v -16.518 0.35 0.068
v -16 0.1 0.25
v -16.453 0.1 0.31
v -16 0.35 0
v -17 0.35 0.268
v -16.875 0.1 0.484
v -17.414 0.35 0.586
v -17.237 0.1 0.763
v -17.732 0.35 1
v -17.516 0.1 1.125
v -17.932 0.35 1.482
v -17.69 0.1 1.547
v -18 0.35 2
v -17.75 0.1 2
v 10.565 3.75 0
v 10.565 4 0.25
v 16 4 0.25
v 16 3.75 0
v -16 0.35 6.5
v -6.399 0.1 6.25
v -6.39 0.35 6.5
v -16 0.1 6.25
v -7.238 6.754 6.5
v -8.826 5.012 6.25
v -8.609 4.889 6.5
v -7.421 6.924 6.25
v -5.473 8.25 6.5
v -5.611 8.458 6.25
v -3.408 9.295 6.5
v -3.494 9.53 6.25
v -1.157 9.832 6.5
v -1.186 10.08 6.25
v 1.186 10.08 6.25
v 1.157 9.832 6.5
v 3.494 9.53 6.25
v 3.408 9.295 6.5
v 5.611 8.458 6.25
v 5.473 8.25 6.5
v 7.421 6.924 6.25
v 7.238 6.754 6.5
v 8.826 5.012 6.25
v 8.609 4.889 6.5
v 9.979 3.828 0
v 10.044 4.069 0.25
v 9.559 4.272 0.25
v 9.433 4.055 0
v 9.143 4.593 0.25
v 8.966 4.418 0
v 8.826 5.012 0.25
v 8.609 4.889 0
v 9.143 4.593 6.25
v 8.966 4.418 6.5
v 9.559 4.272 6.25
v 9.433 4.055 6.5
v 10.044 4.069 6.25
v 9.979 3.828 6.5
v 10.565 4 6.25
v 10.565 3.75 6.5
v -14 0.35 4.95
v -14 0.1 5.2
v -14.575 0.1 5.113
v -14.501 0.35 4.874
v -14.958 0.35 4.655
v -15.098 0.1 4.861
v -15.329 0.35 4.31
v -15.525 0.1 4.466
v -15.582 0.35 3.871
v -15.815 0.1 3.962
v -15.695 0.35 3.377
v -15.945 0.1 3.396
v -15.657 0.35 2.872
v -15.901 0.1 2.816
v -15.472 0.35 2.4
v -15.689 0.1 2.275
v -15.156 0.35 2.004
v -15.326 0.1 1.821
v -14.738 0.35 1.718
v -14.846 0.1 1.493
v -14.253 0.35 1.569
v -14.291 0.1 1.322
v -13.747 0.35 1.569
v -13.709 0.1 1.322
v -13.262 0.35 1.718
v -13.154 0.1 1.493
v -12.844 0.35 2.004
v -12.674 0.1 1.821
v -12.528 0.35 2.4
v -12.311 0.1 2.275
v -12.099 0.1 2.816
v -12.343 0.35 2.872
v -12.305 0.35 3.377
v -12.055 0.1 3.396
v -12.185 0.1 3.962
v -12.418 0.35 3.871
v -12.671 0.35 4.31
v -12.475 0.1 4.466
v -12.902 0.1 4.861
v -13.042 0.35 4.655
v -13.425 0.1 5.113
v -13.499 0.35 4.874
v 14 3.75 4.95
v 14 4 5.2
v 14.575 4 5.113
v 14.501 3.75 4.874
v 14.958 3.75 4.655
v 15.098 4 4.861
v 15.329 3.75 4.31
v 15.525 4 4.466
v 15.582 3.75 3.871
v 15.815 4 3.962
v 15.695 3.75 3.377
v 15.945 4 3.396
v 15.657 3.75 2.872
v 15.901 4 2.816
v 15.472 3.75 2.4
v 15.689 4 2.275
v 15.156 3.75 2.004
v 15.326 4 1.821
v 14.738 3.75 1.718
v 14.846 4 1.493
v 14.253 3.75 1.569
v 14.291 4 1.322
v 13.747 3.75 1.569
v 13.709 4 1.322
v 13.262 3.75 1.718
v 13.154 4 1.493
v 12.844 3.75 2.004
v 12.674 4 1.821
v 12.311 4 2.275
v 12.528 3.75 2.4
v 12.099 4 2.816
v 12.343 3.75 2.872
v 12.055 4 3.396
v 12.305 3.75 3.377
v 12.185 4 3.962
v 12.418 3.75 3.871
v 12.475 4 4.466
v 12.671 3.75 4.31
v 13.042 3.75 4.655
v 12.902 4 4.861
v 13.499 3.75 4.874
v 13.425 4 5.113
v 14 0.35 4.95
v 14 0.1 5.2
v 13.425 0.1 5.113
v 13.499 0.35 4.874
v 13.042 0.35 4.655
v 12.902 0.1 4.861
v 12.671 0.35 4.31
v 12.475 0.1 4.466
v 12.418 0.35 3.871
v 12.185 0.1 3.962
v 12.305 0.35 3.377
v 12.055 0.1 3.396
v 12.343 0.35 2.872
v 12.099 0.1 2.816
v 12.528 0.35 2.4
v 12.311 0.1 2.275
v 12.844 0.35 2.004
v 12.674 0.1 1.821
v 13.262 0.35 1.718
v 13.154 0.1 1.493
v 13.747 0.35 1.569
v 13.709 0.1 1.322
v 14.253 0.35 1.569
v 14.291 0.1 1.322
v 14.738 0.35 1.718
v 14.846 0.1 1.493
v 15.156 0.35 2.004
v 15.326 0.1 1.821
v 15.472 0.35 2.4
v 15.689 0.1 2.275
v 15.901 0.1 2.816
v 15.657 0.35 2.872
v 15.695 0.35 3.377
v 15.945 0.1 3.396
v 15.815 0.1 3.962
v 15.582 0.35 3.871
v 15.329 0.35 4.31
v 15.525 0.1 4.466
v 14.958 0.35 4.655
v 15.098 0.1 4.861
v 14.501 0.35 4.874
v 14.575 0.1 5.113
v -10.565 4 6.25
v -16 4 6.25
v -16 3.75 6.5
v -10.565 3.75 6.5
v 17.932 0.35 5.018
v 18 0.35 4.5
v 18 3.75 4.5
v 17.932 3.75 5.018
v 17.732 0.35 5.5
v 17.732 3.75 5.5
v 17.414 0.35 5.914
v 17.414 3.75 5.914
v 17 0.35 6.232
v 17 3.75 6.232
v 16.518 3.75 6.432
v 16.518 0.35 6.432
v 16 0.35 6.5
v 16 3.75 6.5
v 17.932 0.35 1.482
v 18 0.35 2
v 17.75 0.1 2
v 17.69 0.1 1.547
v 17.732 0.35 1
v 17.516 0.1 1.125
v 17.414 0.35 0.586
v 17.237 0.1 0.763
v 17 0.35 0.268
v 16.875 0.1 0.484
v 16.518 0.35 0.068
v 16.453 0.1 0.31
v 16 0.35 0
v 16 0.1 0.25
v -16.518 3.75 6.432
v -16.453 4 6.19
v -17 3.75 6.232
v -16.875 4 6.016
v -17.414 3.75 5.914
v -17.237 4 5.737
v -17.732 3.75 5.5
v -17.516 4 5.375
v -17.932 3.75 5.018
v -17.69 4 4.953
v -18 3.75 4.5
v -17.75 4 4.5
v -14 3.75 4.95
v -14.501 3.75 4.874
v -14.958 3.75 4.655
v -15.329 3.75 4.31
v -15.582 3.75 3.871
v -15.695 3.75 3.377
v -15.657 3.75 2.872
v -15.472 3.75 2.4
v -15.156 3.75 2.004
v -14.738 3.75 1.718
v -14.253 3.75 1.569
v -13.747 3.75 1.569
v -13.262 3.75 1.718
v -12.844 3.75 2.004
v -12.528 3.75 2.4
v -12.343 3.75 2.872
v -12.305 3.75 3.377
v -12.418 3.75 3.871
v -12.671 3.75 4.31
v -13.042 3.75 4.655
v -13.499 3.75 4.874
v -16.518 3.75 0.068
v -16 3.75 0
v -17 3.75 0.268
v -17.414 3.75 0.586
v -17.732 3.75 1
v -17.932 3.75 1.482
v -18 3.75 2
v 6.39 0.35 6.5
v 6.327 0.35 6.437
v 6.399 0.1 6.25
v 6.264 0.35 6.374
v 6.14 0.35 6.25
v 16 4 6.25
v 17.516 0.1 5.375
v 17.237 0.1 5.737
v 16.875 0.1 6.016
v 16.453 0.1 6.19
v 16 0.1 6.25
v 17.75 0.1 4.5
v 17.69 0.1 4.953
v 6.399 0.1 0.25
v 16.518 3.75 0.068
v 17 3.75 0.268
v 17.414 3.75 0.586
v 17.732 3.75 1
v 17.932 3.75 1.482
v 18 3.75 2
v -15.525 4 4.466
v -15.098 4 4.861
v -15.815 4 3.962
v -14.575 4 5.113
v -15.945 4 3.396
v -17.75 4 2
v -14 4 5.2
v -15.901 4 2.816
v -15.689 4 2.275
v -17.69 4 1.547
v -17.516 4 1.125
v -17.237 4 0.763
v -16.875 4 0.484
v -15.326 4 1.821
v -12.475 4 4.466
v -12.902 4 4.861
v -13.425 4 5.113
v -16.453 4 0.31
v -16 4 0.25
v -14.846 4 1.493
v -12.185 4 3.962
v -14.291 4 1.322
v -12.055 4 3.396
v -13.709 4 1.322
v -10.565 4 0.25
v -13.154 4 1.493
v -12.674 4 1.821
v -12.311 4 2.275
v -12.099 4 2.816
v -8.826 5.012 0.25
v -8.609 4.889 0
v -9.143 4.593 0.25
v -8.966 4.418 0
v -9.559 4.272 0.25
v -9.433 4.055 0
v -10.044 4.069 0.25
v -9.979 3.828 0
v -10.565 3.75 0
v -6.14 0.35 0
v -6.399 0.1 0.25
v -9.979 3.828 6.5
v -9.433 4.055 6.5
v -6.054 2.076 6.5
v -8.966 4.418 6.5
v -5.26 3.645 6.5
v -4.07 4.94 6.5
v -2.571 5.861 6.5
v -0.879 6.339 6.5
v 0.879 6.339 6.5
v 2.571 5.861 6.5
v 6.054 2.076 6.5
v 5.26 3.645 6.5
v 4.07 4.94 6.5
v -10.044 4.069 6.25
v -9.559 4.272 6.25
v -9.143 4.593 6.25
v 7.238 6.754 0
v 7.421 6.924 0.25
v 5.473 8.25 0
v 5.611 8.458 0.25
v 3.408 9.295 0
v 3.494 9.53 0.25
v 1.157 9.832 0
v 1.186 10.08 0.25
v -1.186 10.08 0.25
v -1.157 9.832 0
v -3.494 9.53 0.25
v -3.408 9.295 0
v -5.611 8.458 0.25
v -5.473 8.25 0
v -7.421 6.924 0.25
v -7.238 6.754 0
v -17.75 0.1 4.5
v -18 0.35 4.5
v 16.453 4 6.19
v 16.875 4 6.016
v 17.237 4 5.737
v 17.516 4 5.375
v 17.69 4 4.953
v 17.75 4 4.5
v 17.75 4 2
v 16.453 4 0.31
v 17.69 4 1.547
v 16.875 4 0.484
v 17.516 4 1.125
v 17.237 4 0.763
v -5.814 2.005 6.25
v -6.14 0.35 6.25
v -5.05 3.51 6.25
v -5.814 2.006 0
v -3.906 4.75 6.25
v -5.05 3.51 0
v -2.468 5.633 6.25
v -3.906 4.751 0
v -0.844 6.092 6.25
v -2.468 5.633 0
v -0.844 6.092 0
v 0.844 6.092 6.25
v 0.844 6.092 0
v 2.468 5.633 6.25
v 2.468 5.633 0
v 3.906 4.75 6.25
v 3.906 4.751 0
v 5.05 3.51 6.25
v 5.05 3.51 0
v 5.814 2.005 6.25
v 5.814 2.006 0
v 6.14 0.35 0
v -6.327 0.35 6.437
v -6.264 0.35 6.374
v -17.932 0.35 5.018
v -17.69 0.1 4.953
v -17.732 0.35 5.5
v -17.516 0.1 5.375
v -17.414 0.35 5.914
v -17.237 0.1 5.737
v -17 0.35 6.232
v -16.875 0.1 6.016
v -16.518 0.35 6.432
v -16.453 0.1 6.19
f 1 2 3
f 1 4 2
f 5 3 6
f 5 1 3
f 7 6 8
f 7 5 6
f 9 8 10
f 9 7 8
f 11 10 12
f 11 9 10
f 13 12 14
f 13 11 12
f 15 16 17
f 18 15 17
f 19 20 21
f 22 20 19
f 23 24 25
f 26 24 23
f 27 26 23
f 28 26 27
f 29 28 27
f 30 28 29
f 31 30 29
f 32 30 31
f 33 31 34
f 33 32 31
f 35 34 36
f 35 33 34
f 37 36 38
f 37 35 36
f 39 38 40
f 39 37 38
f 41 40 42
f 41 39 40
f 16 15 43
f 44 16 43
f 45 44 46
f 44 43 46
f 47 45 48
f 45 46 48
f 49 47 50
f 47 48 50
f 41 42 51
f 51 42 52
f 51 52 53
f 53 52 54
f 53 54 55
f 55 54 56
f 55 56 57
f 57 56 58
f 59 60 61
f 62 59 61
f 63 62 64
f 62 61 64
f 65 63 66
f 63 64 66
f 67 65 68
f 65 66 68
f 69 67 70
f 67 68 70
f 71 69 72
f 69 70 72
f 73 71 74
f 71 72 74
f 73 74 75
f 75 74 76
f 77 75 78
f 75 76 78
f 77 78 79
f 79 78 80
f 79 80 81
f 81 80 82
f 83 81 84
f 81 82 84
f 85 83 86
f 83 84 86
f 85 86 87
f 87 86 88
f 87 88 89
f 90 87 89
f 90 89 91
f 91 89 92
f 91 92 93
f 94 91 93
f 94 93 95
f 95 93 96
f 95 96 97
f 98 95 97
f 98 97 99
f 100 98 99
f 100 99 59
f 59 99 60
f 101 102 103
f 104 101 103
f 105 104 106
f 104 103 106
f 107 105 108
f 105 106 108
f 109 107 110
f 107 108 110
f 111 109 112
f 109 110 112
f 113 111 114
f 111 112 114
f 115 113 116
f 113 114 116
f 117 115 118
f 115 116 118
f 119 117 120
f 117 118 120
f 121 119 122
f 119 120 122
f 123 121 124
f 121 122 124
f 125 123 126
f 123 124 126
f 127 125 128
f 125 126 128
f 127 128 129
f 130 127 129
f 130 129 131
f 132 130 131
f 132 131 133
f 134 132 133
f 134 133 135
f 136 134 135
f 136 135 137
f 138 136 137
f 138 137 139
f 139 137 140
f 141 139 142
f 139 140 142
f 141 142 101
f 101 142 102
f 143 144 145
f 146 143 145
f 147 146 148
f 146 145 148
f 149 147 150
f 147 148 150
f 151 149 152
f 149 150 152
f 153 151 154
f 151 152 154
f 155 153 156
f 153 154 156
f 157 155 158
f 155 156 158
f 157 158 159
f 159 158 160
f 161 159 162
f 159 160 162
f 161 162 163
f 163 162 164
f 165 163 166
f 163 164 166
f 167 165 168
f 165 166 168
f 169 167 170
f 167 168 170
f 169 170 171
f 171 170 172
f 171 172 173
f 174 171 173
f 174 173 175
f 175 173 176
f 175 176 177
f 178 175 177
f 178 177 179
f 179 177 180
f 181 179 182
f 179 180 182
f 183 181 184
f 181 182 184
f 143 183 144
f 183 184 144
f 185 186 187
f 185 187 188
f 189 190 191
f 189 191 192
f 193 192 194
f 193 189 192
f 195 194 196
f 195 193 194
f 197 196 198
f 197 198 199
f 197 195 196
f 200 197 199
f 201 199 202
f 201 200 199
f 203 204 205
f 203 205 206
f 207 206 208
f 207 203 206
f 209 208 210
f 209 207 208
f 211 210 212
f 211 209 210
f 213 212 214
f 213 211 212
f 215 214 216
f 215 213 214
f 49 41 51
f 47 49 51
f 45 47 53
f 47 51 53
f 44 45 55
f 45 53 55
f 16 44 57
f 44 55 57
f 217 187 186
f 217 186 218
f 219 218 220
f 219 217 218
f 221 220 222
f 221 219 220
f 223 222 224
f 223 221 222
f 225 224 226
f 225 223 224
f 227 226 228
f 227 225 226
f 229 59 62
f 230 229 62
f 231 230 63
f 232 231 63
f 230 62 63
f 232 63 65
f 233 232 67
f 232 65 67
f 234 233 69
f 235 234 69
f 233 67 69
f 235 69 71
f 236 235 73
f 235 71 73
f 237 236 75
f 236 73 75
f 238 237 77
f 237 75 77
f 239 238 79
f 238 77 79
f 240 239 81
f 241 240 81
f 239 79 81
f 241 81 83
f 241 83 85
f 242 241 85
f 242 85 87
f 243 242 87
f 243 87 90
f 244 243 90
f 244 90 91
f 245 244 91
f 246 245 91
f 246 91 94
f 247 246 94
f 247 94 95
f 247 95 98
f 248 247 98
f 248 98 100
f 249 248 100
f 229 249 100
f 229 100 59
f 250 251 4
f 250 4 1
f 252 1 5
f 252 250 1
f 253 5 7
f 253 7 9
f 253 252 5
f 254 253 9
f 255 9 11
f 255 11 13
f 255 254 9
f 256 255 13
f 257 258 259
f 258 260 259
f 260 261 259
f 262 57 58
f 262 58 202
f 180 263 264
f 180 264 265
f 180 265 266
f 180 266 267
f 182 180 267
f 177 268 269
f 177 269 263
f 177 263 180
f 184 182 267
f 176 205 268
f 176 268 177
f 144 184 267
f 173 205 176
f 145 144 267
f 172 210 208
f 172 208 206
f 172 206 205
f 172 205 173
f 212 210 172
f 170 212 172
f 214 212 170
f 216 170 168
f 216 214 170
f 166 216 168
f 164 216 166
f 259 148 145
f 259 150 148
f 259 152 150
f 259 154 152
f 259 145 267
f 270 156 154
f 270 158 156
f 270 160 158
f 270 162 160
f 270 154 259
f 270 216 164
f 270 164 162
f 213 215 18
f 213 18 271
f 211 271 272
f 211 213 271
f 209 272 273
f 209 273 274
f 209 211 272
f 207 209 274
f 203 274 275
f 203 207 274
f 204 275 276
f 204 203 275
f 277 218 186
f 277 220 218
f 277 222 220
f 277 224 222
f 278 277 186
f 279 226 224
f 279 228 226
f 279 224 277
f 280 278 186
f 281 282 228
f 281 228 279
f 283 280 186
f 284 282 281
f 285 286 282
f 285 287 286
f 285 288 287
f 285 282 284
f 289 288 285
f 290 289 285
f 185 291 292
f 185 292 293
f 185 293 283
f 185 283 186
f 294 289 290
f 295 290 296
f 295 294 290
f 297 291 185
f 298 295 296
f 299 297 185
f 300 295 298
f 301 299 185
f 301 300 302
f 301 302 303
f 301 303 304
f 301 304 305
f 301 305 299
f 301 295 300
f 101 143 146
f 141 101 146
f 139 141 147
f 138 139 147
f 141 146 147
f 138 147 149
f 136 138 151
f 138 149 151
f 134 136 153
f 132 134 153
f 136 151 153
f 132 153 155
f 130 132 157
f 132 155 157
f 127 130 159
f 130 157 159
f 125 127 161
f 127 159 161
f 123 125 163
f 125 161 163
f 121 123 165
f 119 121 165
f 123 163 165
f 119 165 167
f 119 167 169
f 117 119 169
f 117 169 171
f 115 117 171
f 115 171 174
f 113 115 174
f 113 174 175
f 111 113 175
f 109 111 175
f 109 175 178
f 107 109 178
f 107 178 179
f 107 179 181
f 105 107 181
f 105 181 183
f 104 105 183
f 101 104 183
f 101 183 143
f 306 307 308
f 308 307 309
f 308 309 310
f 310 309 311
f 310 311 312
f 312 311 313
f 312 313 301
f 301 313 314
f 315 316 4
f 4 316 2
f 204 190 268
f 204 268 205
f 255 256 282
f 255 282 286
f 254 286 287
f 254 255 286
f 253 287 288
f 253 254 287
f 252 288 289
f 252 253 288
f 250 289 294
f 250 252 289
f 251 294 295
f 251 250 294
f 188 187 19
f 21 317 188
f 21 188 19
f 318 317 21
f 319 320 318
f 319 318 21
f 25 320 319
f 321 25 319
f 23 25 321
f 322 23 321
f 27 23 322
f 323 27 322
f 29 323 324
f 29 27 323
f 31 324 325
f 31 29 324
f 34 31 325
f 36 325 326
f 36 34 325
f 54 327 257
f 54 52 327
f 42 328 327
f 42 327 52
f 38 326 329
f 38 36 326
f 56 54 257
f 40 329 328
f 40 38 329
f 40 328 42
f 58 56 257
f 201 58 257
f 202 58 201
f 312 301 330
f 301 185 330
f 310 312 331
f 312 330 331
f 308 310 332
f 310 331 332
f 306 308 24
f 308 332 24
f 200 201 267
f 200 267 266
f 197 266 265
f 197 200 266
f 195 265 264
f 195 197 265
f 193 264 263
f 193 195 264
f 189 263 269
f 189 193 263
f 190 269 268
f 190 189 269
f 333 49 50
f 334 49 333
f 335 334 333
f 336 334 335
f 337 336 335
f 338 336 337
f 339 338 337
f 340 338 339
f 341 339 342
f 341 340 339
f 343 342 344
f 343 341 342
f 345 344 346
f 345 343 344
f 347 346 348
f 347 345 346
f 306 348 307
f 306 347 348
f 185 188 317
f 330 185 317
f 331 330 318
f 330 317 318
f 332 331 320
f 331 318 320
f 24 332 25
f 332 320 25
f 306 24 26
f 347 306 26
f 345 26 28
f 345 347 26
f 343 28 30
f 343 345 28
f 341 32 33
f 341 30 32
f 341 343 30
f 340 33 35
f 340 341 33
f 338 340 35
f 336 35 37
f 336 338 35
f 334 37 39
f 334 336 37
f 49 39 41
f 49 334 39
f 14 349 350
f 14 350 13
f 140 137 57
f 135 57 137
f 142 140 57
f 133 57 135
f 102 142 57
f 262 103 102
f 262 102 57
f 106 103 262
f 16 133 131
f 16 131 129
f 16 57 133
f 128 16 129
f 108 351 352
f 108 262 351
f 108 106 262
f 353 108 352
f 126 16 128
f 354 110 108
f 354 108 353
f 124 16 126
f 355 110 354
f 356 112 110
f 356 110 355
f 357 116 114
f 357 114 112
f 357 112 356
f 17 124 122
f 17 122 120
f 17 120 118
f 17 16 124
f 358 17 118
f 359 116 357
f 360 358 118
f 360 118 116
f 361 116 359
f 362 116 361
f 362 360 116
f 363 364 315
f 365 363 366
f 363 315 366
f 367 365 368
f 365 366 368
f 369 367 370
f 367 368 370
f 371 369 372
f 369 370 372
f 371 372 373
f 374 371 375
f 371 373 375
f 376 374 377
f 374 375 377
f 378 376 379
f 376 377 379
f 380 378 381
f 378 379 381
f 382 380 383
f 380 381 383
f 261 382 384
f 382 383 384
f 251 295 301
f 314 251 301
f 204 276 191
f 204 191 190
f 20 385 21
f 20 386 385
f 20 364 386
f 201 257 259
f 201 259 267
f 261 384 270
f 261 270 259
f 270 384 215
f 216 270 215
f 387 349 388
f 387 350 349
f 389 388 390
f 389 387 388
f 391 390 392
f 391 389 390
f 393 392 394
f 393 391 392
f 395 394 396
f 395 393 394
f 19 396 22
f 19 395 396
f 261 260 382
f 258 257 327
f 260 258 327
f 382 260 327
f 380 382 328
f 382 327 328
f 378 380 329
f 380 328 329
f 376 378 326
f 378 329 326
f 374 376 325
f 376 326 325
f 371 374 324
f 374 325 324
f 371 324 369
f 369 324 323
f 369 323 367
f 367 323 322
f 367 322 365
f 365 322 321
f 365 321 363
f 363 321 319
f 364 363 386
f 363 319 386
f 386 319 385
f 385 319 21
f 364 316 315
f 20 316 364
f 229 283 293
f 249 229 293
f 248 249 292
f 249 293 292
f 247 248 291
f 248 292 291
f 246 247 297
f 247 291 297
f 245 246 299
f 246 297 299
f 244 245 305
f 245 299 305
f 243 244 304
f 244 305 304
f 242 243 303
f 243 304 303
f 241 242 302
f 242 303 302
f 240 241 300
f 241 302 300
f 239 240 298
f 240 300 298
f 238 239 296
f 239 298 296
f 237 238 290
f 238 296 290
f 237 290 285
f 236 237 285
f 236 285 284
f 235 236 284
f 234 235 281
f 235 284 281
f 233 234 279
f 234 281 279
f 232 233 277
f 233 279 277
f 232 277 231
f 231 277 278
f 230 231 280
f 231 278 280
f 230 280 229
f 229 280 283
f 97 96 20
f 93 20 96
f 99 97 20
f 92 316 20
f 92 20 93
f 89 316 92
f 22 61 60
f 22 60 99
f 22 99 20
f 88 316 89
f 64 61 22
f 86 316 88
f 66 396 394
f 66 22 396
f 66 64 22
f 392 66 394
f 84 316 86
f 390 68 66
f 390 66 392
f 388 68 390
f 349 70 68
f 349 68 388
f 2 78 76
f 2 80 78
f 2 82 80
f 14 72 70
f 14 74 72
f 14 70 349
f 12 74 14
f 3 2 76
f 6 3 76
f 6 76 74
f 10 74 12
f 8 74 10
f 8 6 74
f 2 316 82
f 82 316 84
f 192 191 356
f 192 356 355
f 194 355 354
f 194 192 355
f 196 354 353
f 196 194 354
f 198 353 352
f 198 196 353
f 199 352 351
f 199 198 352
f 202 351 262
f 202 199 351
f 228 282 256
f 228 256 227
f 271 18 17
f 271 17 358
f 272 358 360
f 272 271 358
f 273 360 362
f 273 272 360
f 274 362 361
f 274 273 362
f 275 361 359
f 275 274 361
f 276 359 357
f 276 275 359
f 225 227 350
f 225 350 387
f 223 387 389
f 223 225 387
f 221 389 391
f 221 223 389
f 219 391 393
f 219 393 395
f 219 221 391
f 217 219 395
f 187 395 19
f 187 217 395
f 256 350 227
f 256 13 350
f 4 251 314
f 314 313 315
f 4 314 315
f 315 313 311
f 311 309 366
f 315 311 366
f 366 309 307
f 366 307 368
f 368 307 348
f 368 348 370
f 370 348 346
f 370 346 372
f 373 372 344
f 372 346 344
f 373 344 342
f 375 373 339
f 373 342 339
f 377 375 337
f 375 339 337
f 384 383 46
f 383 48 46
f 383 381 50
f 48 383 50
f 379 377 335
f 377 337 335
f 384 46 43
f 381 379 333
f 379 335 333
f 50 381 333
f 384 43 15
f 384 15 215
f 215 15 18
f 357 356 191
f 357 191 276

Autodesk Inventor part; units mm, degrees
ref_plane "YZ Plane" through (0, 0, 0) normal (1, 0, 0) x (0, 1, 0)
ref_plane "XZ Plane" through (0, 0, 0) normal (0, 1, 0) x (-1, 0, 0)
ref_plane "XY Plane" through (0, 0, 0) normal (0, 0, 1) x (1, 0, 0)
sketch "Sketch1" plane through (0, 0, 0) normal (0, 0, 1) x (1, 0, 0)
  circle A0 centre (0, 0) radius 6.15
  line L0 (-31.1793, -0.1) -> (31.1793, -0.1)
  line L1 (31.1793, -0.1) -> (31.1793, 0.1)
  line L2 (31.1793, 0.1) -> (-31.1793, 0.1)
  line L3 (-31.1793, 0.1) -> (-31.1793, -0.1)
  line L4 (-31.1793, -0.1) -> (31.1793, 0.1) construction
  line L5 (31.1793, -0.1) -> (-31.1793, 0.1) construction
  line L6 (-18, 4) -> (18, 4)
  line L7 (18, 4) -> (18, 0)
  line L8 (18, 0) -> (-18, 0)
  line L9 (-18, 0) -> (-18, 4)
  circle A1 centre (0, 0) radius 10.15
  line L10 (0, 0) -> (0, 10.15) construction
  line L11 (-14, 0) -> (14, 0) construction
  point P0 (0, 6.15)
  point P1 (18, 0.1)
  point P2 (9.3286, 4)
  point P3 (-9.3286, 4)
  point P4 (-18, 0.1)
  point P5 (-6.1492, 0.1)
  point P6 (6.1492, 0.1)
  dimension "d0" = 12.3
  dimension "d1" = 0.2
  dimension "d2" = 4
  dimension "d3" = 4
  dimension "d6" = 28
  dimension "d7" = 4
extrude "Extrusion1" add sketch "Sketch1" along normal blind 6.5 contours A0 L6 A1 L2 | A0 L6 A1 | A1 L6 L7 L2 | L2 A1 L6 A0 | L2 L9 L6 A1
sketch "Sketch2" plane through (9.3286, 4, 0) normal (0, 1, 0) x (1, 0, 0)
  line L0 (-18.6572, 0) -> (-18.6572, -6.5) construction
  line L1 (0, 0) -> (0, -6.5) construction
  line L2 (0, -3.25) -> (4.6714, -3.25) construction
  line L3 (-18.6572, -3.25) -> (-23.3286, -3.25) construction
  point P0 (-9.3286, 0)
  dimension "d8" = 28
hole "Hole1" at (-14, 4, 3.25) at (14, 4, 3.25) direction (0, -1, 0) diameter 3.4 depth 8 clearance for "Flat Head Machine Screw" size "M3" standard "Ansi Metric M Profile"
fillet "Fillet1" radius 2 6 edges at (-18, 2.05, 0) (-18, 2.05, 6.5) (18, 2.05, 0) (18, 2.05, 6.5) (9.3286, 4, 3.25) (-9.3286, 4, 3.25)
chamfer "Chamfer1" distance 0.25 angle 45 33 edges at (0, 10.15, 6.5) (-9.559, 4.2715, 6.5) (-13.2826, 4, 6.5) (-17.4142, 4, 5.9142) (-18, 4, 3.25) (-17.4142, 4, 0.5858) (-13.2826, 4, 0) (-9.559, 4.2715, 0) (0, 10.15, 0) (9.559, 4.2715, 0) (13.2826, 4, 0) (17.4142, 4, 0.5858) (18, 4, 3.25) (17.4142, 4, 5.9142) (13.2826, 4, 6.5) (9.559, 4.2715, 6.5) (0, 6.15, 6.5) (-11.0746, 0.1, 6.5) (-17.4142, 0.1, 5.9142) (-18, 0.1, 3.25) (-17.4142, 0.1, 0.5858) (-11.0746, 0.1, 0) (11.0746, 0.1, 6.5) (17.4142, 0.1, 5.9142) (18, 0.1, 3.25) (17.4142, 0.1, 0.5858) (11.0746, 0.1, 0) (6.1492, 0.1, 3.25) (-6.1492, 0.1, 3.25) (14, 4, 1.55) (-14, 4, 1.55) (14, 0.1, 1.55) (-14, 0.1, 1.55)
properties part number "Idler-Clamp"
